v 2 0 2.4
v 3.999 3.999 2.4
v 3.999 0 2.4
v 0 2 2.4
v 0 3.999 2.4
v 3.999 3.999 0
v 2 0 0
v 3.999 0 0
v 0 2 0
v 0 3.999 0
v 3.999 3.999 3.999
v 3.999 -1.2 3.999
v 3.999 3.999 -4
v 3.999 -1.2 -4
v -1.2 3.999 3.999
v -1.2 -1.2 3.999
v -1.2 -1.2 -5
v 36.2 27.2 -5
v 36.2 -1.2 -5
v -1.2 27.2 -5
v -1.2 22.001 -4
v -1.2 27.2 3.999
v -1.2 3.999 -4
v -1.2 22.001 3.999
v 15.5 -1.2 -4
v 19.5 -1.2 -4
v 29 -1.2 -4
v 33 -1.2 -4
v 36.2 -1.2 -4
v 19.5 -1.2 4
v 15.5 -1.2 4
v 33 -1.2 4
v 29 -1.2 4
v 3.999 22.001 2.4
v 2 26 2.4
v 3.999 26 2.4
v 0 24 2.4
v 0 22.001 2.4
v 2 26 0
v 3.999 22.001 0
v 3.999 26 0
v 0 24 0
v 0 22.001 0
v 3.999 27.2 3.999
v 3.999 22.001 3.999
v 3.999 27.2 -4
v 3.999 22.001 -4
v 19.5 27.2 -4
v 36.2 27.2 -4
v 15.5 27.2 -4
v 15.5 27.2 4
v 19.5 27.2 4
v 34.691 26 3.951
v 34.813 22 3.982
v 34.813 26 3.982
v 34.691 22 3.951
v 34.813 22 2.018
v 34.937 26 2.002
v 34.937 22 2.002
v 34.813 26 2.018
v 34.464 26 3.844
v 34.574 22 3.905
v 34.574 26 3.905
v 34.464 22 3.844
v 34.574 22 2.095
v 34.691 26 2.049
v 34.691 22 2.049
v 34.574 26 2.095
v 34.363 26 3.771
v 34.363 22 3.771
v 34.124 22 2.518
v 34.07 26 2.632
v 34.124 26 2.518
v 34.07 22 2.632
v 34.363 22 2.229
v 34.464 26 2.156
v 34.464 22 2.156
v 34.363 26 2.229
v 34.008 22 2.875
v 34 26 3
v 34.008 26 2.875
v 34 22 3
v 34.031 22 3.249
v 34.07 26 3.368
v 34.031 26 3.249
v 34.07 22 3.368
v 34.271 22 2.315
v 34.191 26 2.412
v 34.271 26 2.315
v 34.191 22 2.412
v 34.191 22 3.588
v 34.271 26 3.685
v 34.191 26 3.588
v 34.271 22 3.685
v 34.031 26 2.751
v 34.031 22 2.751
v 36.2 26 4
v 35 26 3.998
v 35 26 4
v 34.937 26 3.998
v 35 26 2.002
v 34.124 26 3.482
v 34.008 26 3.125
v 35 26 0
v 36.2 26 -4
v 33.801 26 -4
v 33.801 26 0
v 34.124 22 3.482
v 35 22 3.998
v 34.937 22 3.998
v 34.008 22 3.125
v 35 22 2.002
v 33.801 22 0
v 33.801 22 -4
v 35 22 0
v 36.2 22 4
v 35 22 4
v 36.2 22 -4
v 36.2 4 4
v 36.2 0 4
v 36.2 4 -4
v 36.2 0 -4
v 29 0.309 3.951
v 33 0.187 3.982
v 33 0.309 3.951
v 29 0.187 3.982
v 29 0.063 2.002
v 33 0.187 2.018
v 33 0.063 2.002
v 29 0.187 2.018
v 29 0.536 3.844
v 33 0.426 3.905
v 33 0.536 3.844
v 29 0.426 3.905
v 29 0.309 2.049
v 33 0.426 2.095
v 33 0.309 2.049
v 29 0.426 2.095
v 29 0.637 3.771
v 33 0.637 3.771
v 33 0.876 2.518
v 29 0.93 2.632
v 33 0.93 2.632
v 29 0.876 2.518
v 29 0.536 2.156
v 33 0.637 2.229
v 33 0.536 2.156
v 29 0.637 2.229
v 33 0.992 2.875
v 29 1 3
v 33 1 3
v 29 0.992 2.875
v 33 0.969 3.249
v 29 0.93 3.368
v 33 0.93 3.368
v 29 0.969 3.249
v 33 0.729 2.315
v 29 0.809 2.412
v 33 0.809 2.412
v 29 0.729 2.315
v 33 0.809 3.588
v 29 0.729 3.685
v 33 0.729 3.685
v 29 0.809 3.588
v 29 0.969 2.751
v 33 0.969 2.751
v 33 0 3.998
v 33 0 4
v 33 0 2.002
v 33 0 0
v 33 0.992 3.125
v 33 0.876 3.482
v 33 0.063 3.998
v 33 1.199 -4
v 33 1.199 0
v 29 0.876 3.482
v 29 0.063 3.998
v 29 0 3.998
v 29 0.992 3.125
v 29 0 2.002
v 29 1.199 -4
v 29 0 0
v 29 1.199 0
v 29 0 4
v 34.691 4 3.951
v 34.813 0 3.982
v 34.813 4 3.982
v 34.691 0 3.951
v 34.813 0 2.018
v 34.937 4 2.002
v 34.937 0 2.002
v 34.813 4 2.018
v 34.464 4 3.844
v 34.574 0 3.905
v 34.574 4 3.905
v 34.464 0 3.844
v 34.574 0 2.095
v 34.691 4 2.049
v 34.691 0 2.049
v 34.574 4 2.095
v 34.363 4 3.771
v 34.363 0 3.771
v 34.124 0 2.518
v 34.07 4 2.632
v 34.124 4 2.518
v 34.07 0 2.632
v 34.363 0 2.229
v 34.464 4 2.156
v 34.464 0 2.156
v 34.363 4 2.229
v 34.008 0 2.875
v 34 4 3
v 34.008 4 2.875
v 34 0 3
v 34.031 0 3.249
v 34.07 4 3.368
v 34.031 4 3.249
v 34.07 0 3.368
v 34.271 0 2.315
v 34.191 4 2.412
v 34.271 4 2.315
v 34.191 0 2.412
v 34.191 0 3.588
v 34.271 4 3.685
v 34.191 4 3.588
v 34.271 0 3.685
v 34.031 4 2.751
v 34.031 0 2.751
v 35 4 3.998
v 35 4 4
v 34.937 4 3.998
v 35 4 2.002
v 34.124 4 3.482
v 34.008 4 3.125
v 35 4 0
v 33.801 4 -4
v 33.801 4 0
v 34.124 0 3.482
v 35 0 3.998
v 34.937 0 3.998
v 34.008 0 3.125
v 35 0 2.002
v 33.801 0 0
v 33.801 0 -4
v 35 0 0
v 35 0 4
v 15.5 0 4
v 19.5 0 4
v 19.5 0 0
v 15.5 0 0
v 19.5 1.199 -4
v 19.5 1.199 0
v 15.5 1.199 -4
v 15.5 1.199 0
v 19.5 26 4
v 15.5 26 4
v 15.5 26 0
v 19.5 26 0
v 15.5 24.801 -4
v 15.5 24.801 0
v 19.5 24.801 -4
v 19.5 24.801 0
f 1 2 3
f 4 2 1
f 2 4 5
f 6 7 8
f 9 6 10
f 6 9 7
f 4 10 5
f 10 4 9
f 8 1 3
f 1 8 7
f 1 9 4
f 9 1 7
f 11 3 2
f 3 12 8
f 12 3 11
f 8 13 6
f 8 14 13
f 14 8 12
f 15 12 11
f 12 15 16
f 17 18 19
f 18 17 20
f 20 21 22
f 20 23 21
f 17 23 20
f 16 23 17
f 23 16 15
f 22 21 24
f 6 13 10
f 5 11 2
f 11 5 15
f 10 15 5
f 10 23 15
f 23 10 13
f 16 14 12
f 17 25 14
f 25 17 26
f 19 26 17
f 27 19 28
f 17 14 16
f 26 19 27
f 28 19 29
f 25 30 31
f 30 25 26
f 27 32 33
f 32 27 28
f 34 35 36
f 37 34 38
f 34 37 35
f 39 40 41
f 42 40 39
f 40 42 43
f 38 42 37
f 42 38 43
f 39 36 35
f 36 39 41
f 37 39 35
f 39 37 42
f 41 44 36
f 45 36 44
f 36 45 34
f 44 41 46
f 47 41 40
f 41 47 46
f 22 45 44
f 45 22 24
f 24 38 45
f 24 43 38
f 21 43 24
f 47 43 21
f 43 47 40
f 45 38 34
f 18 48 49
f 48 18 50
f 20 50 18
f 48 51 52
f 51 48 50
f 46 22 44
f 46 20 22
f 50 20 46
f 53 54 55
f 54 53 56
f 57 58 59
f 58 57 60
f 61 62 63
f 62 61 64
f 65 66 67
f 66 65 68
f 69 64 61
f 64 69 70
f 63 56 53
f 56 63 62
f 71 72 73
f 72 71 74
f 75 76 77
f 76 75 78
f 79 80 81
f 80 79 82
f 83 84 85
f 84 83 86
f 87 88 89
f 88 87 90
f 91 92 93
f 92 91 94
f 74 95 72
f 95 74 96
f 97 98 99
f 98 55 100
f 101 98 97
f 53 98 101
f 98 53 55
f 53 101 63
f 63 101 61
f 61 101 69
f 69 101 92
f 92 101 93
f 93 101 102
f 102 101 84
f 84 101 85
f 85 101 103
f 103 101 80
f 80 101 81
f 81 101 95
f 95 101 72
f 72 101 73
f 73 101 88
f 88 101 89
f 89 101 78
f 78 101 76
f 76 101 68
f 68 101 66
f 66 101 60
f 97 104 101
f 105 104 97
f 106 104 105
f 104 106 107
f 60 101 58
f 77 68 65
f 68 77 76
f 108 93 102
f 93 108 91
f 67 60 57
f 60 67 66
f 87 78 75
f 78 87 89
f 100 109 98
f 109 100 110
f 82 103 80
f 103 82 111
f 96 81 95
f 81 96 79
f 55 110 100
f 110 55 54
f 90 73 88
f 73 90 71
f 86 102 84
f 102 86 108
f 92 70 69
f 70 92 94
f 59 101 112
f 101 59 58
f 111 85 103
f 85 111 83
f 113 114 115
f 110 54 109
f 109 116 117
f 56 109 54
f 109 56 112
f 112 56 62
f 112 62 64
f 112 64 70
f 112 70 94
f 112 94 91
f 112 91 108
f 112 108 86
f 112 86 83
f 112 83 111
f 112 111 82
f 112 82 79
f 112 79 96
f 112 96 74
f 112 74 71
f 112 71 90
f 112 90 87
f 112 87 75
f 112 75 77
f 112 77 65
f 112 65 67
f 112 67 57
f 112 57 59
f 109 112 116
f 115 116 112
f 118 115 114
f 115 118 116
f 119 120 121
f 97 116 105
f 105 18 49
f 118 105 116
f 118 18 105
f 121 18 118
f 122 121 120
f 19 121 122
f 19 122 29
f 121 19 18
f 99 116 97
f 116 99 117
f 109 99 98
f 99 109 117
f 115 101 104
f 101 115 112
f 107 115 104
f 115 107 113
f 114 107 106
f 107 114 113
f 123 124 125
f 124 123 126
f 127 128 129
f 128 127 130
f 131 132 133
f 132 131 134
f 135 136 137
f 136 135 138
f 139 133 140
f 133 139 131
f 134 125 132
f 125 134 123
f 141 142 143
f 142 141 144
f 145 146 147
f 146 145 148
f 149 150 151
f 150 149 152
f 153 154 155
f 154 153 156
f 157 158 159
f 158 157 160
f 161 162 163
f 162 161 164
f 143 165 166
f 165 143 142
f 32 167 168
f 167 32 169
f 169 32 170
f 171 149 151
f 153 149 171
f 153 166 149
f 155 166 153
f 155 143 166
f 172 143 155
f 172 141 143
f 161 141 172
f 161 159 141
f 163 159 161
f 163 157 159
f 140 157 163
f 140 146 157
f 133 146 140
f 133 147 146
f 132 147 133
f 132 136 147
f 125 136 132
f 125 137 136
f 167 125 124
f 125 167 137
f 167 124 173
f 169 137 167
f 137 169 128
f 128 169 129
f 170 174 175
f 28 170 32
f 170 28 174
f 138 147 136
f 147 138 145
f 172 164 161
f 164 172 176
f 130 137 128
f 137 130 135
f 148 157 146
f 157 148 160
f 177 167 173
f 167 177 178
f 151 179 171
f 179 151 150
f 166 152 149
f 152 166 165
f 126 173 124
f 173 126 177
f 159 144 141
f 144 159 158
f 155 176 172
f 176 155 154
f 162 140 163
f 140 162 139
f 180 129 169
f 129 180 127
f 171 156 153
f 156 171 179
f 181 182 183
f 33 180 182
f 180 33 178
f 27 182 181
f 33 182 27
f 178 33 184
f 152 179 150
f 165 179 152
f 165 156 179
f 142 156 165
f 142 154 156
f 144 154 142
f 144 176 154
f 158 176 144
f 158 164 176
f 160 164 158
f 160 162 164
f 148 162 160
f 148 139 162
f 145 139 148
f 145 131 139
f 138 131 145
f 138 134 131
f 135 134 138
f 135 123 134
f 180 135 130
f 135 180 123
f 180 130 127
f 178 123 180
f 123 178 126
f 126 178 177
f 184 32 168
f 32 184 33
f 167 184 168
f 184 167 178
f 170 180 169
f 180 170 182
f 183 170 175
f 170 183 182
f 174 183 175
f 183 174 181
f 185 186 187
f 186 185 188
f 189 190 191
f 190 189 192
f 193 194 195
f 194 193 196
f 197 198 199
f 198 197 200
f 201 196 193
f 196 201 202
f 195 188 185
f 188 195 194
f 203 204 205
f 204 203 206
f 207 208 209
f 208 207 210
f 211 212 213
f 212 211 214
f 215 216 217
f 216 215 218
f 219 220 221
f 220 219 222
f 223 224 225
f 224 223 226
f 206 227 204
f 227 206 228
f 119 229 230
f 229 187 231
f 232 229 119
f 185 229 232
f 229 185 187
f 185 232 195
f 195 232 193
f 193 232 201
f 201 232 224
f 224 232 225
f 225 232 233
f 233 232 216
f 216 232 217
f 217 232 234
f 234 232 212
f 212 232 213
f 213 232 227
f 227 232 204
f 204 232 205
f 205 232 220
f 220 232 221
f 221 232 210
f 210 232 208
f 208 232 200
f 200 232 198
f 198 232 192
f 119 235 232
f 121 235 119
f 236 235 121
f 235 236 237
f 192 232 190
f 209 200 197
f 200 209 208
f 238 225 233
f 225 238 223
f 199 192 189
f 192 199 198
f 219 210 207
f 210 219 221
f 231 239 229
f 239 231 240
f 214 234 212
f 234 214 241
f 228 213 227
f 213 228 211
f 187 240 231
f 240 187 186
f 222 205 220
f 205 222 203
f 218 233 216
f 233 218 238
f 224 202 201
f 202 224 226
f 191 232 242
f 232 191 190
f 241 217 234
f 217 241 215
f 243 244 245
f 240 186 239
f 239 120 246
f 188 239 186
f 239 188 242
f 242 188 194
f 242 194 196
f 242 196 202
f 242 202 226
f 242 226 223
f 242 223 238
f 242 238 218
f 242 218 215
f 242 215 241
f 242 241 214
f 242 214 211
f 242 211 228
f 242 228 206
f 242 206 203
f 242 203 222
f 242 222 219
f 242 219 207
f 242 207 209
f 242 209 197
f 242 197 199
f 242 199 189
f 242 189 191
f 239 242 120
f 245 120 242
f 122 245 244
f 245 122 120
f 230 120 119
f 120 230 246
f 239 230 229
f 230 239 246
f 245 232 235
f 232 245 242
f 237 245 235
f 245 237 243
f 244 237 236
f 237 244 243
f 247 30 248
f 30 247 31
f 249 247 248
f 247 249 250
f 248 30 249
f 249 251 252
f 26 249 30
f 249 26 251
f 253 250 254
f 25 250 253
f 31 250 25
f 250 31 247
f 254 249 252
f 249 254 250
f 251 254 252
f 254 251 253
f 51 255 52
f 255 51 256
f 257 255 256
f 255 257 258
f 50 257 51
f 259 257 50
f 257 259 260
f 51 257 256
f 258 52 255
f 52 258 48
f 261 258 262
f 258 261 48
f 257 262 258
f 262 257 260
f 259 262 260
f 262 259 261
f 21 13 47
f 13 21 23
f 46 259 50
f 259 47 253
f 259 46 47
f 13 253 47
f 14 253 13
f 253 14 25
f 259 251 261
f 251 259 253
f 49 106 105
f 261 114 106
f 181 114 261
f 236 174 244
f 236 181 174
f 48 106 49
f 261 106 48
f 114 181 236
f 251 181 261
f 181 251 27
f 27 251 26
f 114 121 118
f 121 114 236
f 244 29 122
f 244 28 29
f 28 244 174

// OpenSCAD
// usage: in your project file add:
//    use <wemos_d1_mini_clip.scad>
// Then call:
//    wemos_d1_mini_clip( some_offset);
// This will add the necessary clips to hold the pcb in place.
// offset is the height of the bottom of the pcb from the bottom of the clips, 
// or in other words: the height of the clips.
// The clips are placed to have the bottom side of one of the corners of the PCB at [0,0,0]
//
// The clips are placed "in mid air", you still need to have some ground plate
// to attach the clips to. This is demonstrated in the module demo().
// 
wemos_d1_pcb_width = 26;
wemos_d1_pcb_length = 35;
wemos_d1_pcb_thickness = 2;
wemos_d1_thin_wall = 1.2;
wemos_d1_clip = 1; // radius of the wemos_d1_clip that sticks out at the top of a pillar.
wemos_d1_tab_width = 4;
pilar_w = 4;

// if RF is up, pins are down. 
// the pillar should change direction if this is not the case
// to allow access to the reset button
wemos_RF_up=0; // 0: RF down. 1: RF up

wemos_d1_mini_demo(rf_up=wemos_RF_up);

//offset = 5;
//frame_corner( offset);
 //pillar(offset);
 //frame_corner(5);

module wemos_d1_mini_demo(rf_up=1)
{
    //offset = 5; // the hight of the clip
    height = 5; // the hight of the clip

    wemos_d1_mini_clip( offset=height,wemos_up=rf_up);
    
    // bottom to hold it all together
    translate([-wemos_d1_thin_wall, -wemos_d1_thin_wall,-height]) cube([ wemos_d1_pcb_length, wemos_d1_pcb_width, 1] + 2*[wemos_d1_thin_wall, wemos_d1_thin_wall,0]);
} // of wemos_d1_mini_demo()





module wemos_d1_mini_clip( offset = 5,wemos_up=1)
{
    // frame corners on the NW, NE side
    frame_corner( offset);
    translate([0, wemos_d1_pcb_width, 0]) mirror([0,1,0]) frame_corner(offset);
    
    //two tabs supporting the SE side
    translate([wemos_d1_pcb_length, wemos_d1_pcb_width, 0]) pillar(offset);
    
    // change sides depends on reset pins location (if board flips)
    //translate([wemos_d1_pcb_length-wemos_d1_tab_width - 2*wemos_d1_clip, wemos_d1_pcb_width, 0]) rotate([0,0,90]) pillar(offset);
    angle = 270 - 180*wemos_up; // 90 in org, when RF is UP
    y_shift = wemos_d1_pcb_width*wemos_up; // zero in case of toggle.
    x_shift = -pilar_w*(wemos_up-1);
    
    translate([wemos_d1_pcb_length-wemos_d1_tab_width - 2*wemos_d1_clip+x_shift, y_shift, ])
        rotate([0,0,angle]) pillar(offset);
    
    
    // one pillar supporting the SW side (keep the west open for the reset button)
    translate([wemos_d1_pcb_length, wemos_d1_tab_width, 0]) pillar(offset);
    
    // two extra tabs holding the sides in the E and W position
    translate([wemos_d1_pcb_length + wemos_d1_tab_width, 0, 0] * .5) rotate([0,0,-90]) pillar( offset, false);
    translate([(wemos_d1_pcb_length - wemos_d1_tab_width)/2, wemos_d1_pcb_width, 0] )rotate([0,0,90]) pillar( offset, false);
} // of fwemos_d1_mini_clip()




/**
* essentially a cube with one of the edges cut off.
*/
module edged_box()
{
    rib = 4;
    sag = .4;
    dims = [rib,rib,wemos_d1_pcb_thickness+sag];
    edge_off = 2;
    d = .001;
    d3 = [d,d,d];
    // somewhat convoluted, but it works
    mirror([0,1,0]) translate( [0, -rib, 0])
    difference()
    {
        cube( dims);
        translate([0,rib-edge_off,-d]) 
            rotate([0,0,45]) cube(dims + 2*d3);
    }
}

/**
* Pillar that holds the NE,NW corners of the PCB (the dull-edged corners)
*/
module frame_corner( height)
{
    wemos_d1_thin_wall = 1.2;
    wemos_d1_clip = 1;
    d3 = [.001, .001, .001];
    edge = wemos_d1_pcb_thickness + 2*wemos_d1_clip;
    pillar_dims = [4,4,height + edge] + [wemos_d1_thin_wall, wemos_d1_thin_wall, 0] - d3;

    difference()
    {
        translate([-wemos_d1_thin_wall,-wemos_d1_thin_wall,-height]) cube (pillar_dims);
        edged_box();
    }
}
/**
* A pillar that keeps the edge of the PCB in place. If doClip is true, 
* there will be a little tab at the top of the pillar to push the PCB down.
*/
module pillar( height, doClip=true)
{
    d = .001;
    //pilar_w = 4;
    edge = wemos_d1_pcb_thickness + 2*wemos_d1_clip;
    tab_dims = [wemos_d1_thin_wall, pilar_w, height + edge];
    if (doClip)
    {
        translate([0,-wemos_d1_tab_width/2,edge - wemos_d1_clip]) rotate([90,0,0]) cylinder(h = wemos_d1_tab_width, r = wemos_d1_clip, center=true, $fn = 50);
    }
    translate([0,-wemos_d1_tab_width,-height]) cube( tab_dims);
    translate([-wemos_d1_thin_wall+d, -wemos_d1_tab_width, -height]) cube([wemos_d1_thin_wall, wemos_d1_tab_width, height]);
}

/** 
* clip to hold a wemos d1 mini
* This module can be used in enclosures. It generates clips that can
* hold a Wemos D1 Mini in place
**/
